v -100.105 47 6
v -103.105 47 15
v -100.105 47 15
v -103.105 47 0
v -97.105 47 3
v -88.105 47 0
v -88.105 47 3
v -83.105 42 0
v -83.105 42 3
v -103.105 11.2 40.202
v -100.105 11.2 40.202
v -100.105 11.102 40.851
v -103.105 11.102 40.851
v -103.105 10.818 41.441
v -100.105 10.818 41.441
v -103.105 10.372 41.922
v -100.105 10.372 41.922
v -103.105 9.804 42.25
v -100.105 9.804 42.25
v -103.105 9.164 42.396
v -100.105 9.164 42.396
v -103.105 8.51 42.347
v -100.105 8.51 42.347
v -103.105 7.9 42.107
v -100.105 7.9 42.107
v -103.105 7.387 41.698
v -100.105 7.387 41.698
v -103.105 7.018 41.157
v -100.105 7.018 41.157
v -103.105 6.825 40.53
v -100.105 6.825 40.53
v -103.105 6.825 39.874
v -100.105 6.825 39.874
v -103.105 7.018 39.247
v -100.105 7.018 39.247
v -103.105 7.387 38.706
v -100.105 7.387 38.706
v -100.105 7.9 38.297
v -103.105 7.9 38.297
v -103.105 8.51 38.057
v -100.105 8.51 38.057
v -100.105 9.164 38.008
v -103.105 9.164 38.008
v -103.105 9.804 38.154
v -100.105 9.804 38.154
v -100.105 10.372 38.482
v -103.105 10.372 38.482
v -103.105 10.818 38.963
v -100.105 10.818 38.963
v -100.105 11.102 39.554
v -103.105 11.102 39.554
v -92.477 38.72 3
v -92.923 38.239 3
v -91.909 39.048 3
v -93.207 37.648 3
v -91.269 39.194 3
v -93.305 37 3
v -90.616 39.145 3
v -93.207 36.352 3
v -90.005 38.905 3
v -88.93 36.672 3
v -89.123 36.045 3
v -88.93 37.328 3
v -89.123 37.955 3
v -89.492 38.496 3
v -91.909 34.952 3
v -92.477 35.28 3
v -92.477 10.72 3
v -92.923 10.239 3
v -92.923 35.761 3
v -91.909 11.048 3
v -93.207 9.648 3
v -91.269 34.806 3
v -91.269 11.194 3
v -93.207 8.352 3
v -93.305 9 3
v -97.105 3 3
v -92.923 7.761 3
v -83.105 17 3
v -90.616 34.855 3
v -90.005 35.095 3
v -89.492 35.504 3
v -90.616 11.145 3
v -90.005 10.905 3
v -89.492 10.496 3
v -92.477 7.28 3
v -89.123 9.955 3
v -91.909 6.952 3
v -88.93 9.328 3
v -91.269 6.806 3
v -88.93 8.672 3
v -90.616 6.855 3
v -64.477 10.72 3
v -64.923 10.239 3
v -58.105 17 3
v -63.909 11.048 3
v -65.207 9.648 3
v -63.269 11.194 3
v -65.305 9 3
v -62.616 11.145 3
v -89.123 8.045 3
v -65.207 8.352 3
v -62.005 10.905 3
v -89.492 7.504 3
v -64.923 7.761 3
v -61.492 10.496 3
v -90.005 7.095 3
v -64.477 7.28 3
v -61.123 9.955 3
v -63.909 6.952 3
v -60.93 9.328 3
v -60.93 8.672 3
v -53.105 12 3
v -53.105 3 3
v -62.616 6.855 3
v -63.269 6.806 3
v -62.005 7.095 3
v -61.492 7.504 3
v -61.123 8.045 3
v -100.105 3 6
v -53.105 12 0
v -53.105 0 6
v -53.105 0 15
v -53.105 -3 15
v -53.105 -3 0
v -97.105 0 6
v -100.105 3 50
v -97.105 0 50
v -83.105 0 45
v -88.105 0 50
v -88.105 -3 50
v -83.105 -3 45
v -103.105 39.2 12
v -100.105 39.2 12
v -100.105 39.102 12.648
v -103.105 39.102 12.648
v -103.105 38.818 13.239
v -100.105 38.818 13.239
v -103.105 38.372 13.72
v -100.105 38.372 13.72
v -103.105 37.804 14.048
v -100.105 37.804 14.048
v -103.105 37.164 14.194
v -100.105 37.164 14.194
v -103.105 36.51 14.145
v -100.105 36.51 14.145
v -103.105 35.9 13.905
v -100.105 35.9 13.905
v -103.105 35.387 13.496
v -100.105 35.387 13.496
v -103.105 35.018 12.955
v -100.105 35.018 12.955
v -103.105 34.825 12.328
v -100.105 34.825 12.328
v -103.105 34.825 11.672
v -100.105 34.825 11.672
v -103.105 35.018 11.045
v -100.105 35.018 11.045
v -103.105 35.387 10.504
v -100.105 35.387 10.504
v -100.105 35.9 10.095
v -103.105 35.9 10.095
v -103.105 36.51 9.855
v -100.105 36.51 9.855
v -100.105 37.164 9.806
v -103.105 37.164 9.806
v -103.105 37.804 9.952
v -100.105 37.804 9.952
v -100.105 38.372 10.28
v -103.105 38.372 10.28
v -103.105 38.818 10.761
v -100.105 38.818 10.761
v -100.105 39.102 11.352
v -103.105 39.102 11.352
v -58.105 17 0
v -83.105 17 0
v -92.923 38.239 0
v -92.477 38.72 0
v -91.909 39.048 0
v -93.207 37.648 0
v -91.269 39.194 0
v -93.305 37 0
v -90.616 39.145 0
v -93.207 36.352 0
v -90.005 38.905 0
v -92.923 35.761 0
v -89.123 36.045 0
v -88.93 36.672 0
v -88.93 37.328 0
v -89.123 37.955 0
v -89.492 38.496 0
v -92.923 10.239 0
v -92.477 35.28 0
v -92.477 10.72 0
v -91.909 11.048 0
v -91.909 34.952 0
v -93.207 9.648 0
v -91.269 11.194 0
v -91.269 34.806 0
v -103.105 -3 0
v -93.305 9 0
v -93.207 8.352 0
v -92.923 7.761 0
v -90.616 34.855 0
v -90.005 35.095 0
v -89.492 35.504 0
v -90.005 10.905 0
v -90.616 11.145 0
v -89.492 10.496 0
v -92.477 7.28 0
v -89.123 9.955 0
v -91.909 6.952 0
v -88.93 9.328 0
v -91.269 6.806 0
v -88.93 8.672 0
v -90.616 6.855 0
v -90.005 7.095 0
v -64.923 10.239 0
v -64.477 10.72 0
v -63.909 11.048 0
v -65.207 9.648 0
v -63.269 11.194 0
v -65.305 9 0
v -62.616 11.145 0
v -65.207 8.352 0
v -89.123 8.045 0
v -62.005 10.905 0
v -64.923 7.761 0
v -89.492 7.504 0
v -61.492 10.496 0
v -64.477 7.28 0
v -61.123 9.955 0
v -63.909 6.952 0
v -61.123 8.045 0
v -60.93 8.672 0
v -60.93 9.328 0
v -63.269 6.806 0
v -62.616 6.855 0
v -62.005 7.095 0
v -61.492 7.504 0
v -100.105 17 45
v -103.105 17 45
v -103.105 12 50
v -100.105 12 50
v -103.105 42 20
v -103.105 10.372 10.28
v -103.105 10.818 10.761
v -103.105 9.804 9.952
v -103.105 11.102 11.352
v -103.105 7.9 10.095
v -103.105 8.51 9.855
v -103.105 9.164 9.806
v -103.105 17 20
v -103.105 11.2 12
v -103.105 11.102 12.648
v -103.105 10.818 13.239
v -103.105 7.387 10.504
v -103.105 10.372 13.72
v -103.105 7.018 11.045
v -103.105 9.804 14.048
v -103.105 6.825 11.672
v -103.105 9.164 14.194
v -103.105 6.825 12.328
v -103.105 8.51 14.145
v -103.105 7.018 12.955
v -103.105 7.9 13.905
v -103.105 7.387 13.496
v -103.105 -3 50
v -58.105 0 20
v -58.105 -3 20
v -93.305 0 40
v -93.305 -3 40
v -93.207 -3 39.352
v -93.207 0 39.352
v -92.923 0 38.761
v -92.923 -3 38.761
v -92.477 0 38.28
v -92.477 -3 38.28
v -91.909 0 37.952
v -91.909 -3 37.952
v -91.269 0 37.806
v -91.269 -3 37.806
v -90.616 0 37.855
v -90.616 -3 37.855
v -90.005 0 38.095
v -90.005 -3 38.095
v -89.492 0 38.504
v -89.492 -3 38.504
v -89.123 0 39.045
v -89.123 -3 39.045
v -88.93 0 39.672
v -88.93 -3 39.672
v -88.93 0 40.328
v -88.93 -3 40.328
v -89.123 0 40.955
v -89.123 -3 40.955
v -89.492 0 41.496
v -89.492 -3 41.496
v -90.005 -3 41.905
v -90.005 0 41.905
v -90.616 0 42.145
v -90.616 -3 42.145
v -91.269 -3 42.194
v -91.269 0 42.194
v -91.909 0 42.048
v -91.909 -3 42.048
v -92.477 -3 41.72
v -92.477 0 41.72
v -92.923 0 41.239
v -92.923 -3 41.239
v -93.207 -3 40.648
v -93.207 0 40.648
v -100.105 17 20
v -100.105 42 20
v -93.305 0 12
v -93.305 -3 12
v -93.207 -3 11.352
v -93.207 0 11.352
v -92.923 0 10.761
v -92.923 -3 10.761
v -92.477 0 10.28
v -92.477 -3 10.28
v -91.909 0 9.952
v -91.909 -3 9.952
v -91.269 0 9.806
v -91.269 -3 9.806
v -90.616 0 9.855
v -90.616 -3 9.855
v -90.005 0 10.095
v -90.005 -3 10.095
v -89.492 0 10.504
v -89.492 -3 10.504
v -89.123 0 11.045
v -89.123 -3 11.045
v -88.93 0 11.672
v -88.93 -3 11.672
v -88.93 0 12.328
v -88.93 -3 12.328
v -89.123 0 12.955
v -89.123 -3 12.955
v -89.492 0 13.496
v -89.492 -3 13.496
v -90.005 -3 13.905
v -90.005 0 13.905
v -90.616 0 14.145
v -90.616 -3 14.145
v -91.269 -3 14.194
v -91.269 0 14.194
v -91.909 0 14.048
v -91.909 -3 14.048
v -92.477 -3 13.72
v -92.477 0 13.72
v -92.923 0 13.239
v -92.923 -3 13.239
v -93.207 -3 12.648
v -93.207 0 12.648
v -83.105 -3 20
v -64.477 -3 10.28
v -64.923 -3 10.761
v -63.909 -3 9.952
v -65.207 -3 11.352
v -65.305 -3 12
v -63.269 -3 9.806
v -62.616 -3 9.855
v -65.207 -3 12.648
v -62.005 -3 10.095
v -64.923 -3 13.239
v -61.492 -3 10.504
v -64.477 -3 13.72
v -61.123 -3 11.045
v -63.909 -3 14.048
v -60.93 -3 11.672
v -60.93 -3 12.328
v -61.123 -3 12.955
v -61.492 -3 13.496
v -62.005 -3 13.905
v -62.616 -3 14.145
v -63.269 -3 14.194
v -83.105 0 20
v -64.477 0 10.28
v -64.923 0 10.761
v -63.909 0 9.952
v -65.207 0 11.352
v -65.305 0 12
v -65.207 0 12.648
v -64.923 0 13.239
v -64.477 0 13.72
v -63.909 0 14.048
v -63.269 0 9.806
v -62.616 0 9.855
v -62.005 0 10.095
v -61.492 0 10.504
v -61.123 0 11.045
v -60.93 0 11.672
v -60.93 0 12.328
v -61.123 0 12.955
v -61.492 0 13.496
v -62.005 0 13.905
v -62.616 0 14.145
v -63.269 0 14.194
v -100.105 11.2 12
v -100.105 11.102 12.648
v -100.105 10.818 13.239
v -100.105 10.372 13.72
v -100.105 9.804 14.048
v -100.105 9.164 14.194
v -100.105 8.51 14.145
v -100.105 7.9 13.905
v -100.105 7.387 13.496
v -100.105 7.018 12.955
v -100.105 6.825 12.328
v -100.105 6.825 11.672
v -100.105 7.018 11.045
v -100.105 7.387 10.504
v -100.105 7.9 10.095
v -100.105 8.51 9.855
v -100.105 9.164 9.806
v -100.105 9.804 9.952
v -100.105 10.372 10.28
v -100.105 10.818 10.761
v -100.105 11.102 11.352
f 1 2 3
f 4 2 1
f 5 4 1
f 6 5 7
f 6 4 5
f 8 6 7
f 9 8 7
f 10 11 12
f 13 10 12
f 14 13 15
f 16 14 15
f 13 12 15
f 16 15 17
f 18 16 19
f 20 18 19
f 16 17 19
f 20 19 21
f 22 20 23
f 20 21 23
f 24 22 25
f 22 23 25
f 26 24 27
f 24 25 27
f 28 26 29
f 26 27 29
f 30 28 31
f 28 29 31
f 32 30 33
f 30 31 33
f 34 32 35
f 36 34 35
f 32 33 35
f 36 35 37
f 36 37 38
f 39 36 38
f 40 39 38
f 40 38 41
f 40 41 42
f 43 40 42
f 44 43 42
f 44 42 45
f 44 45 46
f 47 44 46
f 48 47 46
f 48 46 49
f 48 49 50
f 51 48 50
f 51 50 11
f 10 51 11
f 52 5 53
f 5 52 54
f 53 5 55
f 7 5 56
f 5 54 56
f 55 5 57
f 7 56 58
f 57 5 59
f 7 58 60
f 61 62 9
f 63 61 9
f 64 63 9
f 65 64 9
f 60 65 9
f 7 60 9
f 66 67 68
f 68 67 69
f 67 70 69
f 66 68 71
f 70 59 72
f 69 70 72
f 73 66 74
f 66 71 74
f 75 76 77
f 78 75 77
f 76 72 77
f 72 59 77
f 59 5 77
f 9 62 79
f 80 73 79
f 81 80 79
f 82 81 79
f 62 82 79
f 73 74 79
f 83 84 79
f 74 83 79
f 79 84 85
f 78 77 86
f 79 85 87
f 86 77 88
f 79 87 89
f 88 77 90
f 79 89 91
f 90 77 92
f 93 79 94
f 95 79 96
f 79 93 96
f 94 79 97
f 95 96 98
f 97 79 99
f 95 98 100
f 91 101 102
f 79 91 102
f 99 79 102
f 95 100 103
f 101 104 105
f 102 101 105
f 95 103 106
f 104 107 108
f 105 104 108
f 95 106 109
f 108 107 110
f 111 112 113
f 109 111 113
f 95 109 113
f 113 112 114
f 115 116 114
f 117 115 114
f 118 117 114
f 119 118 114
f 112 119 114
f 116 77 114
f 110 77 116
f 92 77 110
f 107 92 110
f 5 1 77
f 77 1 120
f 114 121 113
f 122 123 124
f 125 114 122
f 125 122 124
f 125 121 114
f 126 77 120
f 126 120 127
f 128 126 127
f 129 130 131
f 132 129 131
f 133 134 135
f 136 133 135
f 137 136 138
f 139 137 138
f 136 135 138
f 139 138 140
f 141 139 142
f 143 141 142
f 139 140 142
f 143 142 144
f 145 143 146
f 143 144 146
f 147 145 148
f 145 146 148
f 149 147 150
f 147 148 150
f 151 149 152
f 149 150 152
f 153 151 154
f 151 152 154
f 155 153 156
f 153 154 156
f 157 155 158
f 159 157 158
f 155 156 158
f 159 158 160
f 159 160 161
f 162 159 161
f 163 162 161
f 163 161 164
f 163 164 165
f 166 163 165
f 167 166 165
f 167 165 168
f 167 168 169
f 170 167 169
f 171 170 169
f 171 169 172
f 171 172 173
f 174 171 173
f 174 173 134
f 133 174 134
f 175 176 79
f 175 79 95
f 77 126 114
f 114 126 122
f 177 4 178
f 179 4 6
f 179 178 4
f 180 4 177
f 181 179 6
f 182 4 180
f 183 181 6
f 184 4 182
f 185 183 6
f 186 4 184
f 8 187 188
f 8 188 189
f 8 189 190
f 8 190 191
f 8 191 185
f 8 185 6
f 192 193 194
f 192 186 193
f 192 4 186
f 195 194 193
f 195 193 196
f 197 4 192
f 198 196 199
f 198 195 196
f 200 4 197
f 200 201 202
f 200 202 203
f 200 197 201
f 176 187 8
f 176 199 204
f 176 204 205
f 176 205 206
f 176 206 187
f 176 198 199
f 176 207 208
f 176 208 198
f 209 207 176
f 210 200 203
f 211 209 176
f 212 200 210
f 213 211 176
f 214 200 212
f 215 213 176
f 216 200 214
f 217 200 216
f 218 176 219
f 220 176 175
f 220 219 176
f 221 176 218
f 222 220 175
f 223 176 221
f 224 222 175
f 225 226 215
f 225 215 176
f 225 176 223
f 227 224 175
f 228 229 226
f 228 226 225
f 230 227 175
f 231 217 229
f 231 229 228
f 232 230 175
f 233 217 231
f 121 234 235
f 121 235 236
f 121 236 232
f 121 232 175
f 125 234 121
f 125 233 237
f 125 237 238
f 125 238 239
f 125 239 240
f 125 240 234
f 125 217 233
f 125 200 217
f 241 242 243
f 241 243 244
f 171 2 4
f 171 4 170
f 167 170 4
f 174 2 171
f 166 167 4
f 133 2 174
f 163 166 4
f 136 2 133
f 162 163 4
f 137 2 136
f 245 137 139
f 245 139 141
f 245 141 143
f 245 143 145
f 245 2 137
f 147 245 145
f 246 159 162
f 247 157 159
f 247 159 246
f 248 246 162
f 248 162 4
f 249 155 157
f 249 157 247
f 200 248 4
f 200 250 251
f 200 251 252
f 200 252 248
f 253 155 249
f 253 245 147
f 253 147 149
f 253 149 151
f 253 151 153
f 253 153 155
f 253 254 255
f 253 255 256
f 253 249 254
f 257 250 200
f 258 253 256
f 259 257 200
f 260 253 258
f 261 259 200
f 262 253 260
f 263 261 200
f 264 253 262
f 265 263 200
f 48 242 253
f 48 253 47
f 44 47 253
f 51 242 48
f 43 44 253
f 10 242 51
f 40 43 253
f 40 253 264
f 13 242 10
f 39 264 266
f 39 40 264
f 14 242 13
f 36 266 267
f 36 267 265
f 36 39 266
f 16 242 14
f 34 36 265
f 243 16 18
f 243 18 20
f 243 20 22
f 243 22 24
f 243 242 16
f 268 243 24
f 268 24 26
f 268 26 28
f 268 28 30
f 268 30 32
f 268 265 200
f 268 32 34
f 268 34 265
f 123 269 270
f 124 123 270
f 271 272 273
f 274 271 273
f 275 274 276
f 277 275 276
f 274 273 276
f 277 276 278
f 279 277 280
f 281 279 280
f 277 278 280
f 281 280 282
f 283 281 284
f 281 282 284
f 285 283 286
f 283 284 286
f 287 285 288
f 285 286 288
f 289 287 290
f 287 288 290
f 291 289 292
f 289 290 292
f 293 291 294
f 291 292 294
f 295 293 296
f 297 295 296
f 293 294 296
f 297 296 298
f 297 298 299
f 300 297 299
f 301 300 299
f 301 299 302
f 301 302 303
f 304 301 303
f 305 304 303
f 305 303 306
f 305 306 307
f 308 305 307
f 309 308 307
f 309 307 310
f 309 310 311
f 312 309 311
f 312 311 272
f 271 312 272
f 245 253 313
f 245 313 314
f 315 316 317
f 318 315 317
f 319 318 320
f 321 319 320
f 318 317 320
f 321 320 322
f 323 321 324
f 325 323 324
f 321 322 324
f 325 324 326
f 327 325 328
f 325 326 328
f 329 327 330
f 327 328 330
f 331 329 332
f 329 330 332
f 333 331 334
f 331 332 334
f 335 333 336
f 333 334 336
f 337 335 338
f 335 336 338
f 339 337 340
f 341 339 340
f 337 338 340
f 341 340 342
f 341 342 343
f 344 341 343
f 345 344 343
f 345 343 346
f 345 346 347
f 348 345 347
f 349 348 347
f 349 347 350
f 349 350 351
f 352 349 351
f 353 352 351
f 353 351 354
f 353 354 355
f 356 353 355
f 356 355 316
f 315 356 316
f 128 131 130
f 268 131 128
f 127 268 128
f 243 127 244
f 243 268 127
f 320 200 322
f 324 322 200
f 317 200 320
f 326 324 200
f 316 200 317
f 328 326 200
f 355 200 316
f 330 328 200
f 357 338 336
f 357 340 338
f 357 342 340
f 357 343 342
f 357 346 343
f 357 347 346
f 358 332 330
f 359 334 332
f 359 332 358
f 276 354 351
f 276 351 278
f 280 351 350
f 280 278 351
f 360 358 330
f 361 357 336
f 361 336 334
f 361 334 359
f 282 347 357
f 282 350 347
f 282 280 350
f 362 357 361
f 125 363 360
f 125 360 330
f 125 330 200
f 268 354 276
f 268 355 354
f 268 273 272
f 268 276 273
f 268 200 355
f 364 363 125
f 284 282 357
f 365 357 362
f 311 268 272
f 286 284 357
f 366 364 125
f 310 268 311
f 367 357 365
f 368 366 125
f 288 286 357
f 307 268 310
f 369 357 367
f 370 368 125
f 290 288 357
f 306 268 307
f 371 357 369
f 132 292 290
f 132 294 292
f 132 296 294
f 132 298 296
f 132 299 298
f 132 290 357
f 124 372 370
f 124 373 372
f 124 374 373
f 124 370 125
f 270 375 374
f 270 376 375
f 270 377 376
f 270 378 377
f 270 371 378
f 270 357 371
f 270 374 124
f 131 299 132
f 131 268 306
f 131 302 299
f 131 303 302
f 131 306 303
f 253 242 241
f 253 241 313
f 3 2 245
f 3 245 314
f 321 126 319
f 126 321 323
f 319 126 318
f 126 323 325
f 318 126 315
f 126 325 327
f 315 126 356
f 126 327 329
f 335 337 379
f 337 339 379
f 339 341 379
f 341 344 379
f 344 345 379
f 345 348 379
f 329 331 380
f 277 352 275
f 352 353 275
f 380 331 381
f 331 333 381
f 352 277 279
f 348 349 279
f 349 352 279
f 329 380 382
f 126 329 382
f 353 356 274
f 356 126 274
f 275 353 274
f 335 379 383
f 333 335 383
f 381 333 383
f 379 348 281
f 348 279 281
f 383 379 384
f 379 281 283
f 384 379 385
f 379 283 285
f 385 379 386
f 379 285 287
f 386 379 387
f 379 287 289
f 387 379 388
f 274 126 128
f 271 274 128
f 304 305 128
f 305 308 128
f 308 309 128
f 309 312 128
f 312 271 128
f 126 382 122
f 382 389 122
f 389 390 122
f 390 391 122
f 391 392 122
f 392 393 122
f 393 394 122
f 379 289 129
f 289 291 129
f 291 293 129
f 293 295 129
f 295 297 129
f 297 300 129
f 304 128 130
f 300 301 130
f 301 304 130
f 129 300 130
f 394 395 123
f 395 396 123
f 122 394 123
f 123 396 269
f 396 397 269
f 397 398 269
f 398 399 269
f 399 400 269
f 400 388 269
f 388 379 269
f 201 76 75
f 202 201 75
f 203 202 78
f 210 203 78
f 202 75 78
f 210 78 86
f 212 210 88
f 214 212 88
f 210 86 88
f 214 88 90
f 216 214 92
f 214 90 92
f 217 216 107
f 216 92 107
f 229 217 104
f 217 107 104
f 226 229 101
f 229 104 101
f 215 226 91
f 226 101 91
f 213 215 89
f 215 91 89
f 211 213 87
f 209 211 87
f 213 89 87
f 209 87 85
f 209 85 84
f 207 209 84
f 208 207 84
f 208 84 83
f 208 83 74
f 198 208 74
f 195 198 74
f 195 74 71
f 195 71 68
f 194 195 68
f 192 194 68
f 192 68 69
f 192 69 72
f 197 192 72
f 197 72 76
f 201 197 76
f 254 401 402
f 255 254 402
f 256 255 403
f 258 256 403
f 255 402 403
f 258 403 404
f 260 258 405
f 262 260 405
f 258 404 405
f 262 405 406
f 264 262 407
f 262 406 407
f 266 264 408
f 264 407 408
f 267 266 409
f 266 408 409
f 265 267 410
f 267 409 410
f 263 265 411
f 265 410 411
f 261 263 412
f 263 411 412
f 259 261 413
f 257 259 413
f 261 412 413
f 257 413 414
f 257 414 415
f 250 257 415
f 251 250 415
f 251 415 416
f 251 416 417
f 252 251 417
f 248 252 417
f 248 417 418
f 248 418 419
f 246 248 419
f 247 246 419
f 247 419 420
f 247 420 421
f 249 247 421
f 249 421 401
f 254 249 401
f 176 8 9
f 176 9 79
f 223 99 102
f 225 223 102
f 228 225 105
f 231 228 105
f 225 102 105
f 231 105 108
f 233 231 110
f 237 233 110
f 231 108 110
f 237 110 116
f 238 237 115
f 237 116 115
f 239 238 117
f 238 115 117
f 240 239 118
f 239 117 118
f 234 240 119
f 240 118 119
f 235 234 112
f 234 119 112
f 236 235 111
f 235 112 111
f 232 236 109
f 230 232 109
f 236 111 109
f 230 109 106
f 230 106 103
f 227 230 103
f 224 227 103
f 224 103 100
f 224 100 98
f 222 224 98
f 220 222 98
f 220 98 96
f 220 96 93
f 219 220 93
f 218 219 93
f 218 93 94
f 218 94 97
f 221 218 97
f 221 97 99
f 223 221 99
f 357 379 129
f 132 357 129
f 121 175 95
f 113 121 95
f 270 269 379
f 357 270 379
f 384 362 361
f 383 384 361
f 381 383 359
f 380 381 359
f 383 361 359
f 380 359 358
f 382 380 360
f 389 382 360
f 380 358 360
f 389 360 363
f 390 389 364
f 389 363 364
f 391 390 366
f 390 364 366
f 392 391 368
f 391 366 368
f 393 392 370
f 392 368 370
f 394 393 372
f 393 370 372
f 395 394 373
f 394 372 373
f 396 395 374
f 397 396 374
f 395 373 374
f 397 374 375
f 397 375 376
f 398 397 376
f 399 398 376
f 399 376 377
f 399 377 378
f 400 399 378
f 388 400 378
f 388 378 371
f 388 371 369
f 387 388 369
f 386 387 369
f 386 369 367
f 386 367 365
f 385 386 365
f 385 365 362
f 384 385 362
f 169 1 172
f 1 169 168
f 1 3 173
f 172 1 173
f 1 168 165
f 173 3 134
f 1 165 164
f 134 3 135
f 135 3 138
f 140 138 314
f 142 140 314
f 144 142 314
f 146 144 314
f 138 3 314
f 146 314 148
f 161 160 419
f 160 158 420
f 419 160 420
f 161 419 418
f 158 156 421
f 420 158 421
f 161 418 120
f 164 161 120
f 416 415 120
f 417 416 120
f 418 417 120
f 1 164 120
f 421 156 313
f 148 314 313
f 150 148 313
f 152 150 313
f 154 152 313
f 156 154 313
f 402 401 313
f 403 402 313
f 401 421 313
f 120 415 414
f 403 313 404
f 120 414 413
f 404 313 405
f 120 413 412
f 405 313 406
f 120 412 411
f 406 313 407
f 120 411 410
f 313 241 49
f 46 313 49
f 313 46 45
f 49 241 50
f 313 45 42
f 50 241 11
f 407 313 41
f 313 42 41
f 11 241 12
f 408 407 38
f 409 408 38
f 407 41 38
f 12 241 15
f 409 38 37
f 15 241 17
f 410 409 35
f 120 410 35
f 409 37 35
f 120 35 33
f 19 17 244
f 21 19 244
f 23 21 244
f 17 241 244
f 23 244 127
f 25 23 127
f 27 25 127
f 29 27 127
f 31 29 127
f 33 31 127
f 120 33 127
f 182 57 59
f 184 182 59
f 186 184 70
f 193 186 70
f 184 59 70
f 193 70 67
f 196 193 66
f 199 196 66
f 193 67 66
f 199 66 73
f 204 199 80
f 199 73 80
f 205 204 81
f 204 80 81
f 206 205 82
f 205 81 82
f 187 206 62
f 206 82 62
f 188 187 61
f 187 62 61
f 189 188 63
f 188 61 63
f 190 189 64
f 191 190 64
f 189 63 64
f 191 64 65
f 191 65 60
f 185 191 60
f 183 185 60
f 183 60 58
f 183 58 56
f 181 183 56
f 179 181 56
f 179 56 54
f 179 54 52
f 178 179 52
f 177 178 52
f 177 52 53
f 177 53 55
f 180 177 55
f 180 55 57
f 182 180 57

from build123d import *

# Parameters (mm, degrees)
F1_DEPTH       = 3
F3_DEPTH       = 3
F5_DEPTH       = 3
F6_D           = 4.4
F6_DEPTH       = 80
F6_TIP         = 1.3218933619
F7_D           = 4.4
F7_DEPTH       = 80
F7_TIP         = 1.3218933619
F7_ON_F4_D     = 4.4
F7_ON_F4_DEPTH = 80
F7_ON_F4_TIP   = 1.3218933619
F9_SIZE        = 3
F10_SIZE       = 5


with BuildPart() as f1:
    # F0 (on Front) → F1 (new body)
    with BuildSketch(Plane.XZ):
        Polygon((-83.1050851941, 50), (-103.1050851941, 50), (-103.1050851941, 0), (-53.1050851941, 0), (-53.1050851941, 20), (-83.1050851941, 20), align=None)
    extrude(amount=F1_DEPTH)

    # F2 (on face) → F3 (join)
    with BuildSketch(Plane(origin=(-103.1050851941, 0, 0), x_dir=(0, -1, 0), z_dir=(-1, 0, 0))):
        Polygon((0, 0), (0, 50), (-17, 50), (-17, 20), (-47, 20), (-47, 0), align=None)
    extrude(amount=-F3_DEPTH)

    # F4 (on face) → F5 (join)
    with BuildSketch(Plane(origin=(0, 0, 0), x_dir=(1, 0, 0), z_dir=(0, 0, -1))):
        Polygon((-53.1050851941, -17), (-53.1050851941, 3), (-103.1050851941, 3), (-103.1050851941, -47), (-83.1050851941, -47), (-83.1050851941, -17), align=None)
    extrude(amount=-F5_DEPTH)

    # F6
    with Locations(Plane(origin=(0, 0, 0), x_dir=(1, 0, 0), z_dir=(0, 1, 0))):
        with Locations((-63.1050851941, -12), (-91.1050851941, -40), (-91.1050851941, -12)):
            Hole(F6_D / 2, depth=F6_DEPTH)
            with Locations((0, 0, -(F6_DEPTH + F6_TIP / 2))):  # 118° drill point
                Cone(0, F6_D / 2, F6_TIP, mode=Mode.SUBTRACT)

    # F7
    with Locations(Plane(origin=(-103.1050851941, 0, 0), x_dir=(0, -1, 0), z_dir=(-1, 0, 0))):
        with Locations((-9, 40.2020410289), (-37, 12), (-9, 12)):
            Hole(F7_D / 2, depth=F7_DEPTH)
            with Locations((0, 0, -(F7_DEPTH + F7_TIP / 2))):  # 118° drill point
                Cone(0, F7_D / 2, F7_TIP, mode=Mode.SUBTRACT)

    # F7 on F4
    with Locations(Plane(origin=(0, 0, 0), x_dir=(1, 0, 0), z_dir=(0, 0, -1))):
        with Locations((-91.1050851941, -9), (-91.1050851941, -37), (-63.1050851941, -9)):
            Hole(F7_ON_F4_D / 2, depth=F7_ON_F4_DEPTH)
            with Locations((0, 0, -(F7_ON_F4_DEPTH + F7_ON_F4_TIP / 2))):  # 118° drill point
                Cone(0, F7_ON_F4_D / 2, F7_ON_F4_TIP, mode=Mode.SUBTRACT)

    # F9
    f9_edges = [f1.edges().sort_by_distance(p)[0] for p in [
        (-76.605085, 0, 3),
        (-100.105085, 23.5, 3),
        (-100.105085, 0, 26.5),
    ]]
    chamfer(f9_edges, length=F9_SIZE)

    # F10
    f10_edges = [f1.edges().sort_by_distance(p)[0] for p in [
        (-53.105085, -1.5, 20),
        (-53.105085, 17, 1.5),
        (-83.105085, 47, 1.5),
        (-101.605085, 47, 20),
        (-83.105085, -1.5, 50),
        (-101.605085, 17, 50),
    ]]
    chamfer(f10_edges, length=F10_SIZE)


solid = f1.part
